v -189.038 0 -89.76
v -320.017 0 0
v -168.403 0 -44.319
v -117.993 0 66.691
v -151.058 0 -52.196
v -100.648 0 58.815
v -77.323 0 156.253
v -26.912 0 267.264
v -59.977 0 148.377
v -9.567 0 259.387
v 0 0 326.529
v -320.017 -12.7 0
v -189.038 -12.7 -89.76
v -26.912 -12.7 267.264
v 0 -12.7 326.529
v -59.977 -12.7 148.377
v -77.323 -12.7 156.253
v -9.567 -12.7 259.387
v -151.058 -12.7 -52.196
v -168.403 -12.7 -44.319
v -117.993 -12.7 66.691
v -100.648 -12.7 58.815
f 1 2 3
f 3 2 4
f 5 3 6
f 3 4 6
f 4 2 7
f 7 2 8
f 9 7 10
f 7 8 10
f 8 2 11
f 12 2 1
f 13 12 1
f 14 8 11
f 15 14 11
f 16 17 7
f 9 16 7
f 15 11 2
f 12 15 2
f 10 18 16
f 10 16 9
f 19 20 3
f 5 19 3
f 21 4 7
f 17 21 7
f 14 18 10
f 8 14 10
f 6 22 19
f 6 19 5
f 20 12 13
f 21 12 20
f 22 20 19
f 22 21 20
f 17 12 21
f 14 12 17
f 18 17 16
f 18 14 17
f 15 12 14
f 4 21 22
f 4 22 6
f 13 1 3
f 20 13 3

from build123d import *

# Parameters (mm, degrees)
F1_DEPTH = 12.7
F2_W     = 12.7
F2_H     = 121.92
F3_DEPTH = 19.05


with BuildPart() as f1:
    # F0 (on Front) → F1 (new body)
    with BuildSketch(Plane.XZ):
        Polygon((0, 326.5288198487), (-320.0168273829, 0), (-189.0380174544, -89.7601038052), align=None)
    extrude(amount=F1_DEPTH)

    # F2 (on face) → F3 (join)
    with BuildSketch(Plane(origin=(-122.9286422393, 0, 55.8222558826), x_dir=(0, 1, 0), z_dir=(0.9105182057, 0, -0.4134689796))):
        with Locations((-6.35, 171.261092267)):
            Rectangle(F2_W, F2_H)
        with Locations((-6.35, -49.0228463048)):
            Rectangle(F2_W, F2_H)
    extrude(amount=F3_DEPTH)


solid = f1.part
